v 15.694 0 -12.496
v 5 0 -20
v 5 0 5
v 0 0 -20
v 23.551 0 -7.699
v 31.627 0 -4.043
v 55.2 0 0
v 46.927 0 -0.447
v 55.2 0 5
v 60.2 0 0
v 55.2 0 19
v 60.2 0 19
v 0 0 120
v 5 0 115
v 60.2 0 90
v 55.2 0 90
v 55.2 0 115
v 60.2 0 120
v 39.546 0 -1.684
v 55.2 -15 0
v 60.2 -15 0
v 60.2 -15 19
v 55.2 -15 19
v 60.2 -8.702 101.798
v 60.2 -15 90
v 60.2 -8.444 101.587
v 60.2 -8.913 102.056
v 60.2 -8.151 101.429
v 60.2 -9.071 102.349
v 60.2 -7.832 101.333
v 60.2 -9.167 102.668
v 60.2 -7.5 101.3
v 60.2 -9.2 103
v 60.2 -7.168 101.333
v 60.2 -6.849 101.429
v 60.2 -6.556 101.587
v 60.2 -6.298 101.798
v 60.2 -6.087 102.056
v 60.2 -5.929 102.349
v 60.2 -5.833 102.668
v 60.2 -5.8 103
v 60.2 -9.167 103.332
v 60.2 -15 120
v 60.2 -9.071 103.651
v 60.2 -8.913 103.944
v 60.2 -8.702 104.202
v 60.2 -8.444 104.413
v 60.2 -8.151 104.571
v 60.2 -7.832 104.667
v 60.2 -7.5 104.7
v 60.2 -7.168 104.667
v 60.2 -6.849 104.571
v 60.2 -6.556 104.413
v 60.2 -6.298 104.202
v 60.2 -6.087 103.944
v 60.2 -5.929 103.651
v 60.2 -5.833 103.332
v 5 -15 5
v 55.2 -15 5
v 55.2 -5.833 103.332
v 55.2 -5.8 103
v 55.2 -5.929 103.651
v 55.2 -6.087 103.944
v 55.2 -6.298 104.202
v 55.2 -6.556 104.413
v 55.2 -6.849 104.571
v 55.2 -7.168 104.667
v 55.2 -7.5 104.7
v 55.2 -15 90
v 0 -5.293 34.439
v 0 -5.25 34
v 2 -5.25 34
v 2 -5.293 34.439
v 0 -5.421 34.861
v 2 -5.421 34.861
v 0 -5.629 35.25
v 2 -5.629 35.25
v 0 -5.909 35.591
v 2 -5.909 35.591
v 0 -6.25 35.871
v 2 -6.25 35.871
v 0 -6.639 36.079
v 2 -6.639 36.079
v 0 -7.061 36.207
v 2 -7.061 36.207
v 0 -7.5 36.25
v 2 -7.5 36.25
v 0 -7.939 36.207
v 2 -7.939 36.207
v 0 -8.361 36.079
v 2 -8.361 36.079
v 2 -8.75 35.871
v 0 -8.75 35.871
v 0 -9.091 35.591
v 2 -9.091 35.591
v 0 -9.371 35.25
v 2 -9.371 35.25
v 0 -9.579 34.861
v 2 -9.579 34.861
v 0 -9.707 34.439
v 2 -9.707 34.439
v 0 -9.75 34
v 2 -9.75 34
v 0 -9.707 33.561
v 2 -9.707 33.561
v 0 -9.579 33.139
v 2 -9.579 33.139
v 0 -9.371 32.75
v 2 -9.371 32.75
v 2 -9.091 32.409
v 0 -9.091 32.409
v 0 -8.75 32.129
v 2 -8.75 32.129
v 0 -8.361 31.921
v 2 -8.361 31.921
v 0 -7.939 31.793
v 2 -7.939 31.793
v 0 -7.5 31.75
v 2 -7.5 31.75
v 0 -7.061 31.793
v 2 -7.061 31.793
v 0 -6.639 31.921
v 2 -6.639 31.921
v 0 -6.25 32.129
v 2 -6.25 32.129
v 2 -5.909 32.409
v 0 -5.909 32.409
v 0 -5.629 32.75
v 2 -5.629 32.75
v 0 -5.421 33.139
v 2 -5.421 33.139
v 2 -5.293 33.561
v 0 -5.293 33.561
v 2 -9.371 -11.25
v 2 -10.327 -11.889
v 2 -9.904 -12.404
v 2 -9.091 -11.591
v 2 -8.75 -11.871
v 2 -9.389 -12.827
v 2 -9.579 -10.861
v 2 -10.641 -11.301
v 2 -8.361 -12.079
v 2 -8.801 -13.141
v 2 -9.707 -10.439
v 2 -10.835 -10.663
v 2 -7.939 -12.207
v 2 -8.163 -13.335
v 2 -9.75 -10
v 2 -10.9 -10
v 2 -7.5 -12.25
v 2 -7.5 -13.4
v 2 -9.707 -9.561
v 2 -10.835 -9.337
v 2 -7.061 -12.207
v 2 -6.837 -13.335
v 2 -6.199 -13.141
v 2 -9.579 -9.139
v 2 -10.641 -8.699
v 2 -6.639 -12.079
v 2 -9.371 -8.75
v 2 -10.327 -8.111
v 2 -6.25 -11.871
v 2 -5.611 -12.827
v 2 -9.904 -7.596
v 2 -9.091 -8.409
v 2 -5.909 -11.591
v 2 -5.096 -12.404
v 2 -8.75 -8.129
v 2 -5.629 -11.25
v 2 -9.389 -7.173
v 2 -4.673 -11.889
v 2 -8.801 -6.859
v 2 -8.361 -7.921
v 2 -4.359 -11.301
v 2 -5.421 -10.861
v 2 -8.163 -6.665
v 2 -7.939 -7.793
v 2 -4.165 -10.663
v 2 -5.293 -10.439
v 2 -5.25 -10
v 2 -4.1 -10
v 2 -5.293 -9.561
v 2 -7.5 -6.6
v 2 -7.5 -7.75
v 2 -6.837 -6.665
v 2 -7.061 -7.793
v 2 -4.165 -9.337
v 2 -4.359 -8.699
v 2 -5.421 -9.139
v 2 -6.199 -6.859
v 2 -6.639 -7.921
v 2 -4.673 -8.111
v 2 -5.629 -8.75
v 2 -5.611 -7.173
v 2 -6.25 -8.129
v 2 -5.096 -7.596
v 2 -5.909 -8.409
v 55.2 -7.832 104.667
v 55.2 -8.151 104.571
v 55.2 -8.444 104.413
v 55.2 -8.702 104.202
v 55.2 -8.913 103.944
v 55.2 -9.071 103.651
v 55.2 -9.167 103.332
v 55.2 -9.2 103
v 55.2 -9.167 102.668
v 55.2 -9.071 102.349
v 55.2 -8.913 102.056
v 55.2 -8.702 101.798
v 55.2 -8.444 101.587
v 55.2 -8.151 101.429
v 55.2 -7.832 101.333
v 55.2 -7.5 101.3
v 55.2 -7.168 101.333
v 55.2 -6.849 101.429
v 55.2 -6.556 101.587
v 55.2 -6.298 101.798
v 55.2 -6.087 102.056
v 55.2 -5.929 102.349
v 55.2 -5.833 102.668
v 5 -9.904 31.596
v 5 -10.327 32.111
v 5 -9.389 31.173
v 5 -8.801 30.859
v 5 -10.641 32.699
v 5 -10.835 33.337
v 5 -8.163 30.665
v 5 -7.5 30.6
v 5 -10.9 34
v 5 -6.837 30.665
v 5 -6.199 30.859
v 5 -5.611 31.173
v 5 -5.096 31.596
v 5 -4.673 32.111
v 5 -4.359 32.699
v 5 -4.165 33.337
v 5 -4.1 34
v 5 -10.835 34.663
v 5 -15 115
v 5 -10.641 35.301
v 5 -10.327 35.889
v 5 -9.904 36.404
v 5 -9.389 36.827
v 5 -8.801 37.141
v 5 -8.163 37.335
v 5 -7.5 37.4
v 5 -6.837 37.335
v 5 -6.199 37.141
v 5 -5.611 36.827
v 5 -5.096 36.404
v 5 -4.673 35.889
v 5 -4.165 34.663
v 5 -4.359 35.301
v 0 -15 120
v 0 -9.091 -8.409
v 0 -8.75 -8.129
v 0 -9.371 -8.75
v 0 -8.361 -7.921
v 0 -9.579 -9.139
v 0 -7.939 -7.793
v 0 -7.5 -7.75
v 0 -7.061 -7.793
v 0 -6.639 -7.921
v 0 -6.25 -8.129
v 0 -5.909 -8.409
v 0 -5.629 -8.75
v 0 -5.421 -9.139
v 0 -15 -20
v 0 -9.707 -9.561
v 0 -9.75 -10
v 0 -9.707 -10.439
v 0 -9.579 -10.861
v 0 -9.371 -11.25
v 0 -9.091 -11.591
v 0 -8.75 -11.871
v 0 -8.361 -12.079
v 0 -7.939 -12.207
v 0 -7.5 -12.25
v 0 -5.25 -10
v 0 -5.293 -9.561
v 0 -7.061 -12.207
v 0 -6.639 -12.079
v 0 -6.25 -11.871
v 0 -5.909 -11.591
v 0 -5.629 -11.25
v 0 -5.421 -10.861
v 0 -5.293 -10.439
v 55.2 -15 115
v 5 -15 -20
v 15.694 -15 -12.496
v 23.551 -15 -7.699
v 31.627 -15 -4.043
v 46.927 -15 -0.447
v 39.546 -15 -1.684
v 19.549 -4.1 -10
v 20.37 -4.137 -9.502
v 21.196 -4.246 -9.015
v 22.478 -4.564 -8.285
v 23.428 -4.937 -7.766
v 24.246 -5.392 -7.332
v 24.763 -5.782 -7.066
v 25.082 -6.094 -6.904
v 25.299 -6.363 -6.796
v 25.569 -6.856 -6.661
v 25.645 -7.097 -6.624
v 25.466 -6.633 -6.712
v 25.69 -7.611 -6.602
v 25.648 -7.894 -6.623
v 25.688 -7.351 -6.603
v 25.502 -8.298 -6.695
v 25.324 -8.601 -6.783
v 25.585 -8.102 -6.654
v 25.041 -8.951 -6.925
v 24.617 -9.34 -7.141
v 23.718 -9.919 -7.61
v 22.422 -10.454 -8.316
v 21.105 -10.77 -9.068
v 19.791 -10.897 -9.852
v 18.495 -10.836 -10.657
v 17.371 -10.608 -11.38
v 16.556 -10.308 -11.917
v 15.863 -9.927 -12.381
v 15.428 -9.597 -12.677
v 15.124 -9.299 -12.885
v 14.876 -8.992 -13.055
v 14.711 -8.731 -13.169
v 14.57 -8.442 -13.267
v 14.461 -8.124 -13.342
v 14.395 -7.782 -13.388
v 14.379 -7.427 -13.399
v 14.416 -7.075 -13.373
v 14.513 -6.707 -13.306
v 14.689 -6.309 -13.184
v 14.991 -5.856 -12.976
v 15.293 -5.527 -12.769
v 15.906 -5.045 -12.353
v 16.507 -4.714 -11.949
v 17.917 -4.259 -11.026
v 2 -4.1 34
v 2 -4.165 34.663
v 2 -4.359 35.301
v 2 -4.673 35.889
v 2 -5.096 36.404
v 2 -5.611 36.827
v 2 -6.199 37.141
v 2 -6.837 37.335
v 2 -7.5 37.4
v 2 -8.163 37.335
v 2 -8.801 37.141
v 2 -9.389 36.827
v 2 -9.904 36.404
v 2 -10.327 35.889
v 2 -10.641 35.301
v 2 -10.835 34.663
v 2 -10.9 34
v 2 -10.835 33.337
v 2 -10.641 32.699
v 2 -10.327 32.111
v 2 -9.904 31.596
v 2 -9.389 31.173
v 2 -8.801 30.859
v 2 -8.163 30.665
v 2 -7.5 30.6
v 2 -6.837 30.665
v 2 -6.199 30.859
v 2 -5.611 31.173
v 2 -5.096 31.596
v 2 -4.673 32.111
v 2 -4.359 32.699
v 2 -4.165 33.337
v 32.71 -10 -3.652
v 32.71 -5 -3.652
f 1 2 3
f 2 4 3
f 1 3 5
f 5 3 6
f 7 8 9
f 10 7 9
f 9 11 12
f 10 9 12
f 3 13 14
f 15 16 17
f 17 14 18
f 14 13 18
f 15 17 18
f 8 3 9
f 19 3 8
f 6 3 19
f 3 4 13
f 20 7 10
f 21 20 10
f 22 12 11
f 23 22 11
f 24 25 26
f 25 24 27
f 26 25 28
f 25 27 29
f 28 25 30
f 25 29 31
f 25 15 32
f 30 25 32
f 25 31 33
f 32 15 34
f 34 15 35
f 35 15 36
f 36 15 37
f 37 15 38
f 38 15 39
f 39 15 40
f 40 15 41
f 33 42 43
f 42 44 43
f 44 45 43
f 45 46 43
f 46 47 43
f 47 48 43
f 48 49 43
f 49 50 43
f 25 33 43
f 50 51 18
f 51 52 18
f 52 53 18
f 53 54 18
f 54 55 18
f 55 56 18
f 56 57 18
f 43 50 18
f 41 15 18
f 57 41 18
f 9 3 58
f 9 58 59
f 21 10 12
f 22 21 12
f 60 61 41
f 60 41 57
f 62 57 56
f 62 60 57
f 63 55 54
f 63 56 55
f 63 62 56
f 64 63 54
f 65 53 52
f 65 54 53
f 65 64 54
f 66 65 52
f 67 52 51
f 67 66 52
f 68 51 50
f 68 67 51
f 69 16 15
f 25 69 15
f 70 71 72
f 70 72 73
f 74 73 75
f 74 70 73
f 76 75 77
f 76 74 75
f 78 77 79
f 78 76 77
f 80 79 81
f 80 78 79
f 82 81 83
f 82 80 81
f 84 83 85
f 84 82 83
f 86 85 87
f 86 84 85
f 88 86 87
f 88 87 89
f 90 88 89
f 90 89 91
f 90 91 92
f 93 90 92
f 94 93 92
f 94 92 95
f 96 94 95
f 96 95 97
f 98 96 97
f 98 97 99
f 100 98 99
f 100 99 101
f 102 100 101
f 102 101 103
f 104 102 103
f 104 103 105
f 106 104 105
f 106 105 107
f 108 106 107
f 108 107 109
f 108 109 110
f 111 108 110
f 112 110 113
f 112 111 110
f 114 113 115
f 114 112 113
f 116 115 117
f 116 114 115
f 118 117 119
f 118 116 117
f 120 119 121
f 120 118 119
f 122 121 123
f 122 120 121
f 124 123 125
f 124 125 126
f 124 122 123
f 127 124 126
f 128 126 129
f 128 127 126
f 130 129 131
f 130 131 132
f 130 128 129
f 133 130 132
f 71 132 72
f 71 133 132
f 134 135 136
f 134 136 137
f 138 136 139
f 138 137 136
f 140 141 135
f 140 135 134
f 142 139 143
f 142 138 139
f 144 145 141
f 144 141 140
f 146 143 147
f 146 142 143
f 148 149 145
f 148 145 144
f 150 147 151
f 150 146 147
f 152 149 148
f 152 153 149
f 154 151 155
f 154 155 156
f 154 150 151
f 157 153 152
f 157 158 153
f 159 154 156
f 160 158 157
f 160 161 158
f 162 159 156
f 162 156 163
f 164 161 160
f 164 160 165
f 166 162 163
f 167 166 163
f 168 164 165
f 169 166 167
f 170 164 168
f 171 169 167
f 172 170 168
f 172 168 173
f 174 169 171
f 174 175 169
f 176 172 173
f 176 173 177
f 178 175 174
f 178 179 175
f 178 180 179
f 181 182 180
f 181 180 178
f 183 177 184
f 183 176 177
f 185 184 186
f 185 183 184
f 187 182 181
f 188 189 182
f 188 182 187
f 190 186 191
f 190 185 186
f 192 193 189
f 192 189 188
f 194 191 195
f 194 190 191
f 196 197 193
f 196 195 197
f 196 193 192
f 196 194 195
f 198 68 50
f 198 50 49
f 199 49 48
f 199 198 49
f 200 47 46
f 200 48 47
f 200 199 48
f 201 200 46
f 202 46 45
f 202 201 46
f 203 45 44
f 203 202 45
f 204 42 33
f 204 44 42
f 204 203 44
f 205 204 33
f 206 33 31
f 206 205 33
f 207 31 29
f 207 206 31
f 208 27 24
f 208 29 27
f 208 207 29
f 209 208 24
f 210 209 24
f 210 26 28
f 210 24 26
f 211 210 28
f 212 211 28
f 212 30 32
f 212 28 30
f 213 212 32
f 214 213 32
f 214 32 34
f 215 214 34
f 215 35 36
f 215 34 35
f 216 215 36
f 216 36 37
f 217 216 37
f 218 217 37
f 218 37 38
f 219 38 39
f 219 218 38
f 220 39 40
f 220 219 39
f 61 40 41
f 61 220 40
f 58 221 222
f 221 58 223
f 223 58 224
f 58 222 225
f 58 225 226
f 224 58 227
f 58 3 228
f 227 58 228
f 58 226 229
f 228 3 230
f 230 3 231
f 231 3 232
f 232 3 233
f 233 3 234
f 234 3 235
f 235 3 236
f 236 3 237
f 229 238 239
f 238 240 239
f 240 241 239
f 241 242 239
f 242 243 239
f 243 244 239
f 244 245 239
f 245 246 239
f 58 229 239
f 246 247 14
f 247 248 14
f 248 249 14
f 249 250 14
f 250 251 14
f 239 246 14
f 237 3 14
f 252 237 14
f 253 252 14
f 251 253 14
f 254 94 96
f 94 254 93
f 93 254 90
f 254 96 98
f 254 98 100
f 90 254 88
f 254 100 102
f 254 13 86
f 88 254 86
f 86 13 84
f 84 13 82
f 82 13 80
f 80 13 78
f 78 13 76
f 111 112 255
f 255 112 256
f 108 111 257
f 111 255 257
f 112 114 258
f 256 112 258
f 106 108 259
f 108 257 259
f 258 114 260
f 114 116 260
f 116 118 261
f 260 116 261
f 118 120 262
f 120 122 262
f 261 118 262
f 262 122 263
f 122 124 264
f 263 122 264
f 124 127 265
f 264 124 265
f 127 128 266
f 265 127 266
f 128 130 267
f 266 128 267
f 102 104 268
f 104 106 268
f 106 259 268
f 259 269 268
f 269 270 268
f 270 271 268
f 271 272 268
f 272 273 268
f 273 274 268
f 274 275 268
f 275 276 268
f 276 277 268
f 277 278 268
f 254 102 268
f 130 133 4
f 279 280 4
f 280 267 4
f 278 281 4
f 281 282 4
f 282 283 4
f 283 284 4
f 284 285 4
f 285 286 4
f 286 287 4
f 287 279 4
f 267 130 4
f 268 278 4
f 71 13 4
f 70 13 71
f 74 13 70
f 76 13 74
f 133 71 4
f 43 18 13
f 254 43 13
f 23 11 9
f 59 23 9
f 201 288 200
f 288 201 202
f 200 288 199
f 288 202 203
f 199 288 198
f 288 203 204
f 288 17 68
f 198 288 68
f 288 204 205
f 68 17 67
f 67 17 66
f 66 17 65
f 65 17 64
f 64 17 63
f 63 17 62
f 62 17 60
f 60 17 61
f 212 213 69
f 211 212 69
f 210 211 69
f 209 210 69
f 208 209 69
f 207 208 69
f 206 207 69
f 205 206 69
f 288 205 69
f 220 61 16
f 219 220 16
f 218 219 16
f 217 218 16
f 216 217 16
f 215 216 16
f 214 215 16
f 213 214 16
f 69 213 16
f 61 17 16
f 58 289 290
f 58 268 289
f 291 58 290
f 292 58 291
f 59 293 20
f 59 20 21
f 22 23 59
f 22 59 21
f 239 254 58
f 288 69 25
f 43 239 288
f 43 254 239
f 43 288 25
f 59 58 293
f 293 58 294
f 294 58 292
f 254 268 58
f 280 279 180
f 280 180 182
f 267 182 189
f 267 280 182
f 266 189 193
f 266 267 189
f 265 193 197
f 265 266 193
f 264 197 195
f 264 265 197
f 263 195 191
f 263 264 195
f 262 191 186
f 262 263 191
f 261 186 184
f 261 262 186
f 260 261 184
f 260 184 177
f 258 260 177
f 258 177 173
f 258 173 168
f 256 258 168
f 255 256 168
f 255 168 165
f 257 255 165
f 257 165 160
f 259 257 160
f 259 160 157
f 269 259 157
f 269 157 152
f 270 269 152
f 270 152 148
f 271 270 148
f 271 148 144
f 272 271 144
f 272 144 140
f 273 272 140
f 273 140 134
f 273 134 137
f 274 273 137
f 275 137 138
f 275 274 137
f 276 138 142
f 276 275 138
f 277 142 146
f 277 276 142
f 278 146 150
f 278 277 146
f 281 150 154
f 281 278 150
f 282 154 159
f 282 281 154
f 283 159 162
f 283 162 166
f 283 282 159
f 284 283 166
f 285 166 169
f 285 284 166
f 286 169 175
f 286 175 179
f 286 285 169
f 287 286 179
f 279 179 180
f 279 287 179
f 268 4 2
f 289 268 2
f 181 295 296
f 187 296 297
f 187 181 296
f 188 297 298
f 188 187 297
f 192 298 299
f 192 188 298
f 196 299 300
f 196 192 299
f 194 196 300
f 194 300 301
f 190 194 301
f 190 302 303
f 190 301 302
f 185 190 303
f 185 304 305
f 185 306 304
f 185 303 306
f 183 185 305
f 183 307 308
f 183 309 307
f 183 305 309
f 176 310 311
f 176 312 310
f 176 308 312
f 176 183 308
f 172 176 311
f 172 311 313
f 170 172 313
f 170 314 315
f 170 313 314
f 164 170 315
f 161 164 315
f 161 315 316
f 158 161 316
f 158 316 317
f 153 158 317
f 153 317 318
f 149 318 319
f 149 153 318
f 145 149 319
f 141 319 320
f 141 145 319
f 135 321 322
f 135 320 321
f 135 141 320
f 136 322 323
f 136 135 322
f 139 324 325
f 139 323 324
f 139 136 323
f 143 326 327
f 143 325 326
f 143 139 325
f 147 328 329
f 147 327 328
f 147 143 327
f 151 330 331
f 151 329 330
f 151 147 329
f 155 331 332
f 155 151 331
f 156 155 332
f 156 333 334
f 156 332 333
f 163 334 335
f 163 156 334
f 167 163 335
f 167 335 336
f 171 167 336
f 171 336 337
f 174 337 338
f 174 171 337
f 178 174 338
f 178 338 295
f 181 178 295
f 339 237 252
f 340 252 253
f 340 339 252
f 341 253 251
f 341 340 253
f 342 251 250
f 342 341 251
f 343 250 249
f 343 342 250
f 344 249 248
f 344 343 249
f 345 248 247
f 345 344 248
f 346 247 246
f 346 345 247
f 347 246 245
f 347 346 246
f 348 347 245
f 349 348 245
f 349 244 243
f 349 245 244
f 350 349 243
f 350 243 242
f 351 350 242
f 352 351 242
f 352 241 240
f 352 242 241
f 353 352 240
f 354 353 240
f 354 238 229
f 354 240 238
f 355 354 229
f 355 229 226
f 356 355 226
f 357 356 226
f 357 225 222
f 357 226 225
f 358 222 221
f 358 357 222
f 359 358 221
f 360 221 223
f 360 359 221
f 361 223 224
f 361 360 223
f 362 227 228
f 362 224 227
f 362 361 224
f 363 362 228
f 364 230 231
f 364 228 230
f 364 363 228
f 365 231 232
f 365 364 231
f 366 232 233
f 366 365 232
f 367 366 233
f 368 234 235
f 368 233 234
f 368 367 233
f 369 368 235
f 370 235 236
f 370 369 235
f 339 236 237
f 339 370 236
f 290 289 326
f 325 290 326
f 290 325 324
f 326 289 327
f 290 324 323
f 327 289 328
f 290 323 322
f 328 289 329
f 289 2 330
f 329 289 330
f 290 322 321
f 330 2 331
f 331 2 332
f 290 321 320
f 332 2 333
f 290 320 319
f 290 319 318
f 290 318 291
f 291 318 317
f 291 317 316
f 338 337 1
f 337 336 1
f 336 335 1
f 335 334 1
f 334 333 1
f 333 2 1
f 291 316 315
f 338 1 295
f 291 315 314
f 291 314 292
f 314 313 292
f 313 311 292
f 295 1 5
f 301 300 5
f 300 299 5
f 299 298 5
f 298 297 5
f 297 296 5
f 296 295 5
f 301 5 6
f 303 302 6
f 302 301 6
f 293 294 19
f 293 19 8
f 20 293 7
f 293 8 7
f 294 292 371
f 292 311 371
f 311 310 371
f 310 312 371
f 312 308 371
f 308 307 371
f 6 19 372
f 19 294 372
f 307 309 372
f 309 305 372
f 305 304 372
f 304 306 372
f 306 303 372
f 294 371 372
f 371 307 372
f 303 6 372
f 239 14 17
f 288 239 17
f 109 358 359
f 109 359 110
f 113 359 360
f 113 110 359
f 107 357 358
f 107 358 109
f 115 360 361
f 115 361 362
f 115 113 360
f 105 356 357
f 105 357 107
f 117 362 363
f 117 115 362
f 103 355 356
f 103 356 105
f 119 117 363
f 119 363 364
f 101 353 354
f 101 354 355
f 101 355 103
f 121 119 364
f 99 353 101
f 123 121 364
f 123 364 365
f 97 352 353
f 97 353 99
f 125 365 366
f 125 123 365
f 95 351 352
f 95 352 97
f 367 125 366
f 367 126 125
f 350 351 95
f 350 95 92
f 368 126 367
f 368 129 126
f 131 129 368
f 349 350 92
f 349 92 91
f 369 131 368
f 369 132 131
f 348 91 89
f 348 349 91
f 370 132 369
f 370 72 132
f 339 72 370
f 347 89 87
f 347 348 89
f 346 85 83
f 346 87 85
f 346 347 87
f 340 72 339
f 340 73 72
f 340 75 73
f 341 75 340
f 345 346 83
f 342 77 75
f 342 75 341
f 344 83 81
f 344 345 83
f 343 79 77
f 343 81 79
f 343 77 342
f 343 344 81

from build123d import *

# Parameters (mm, degrees)
F1_W     = 5
F1_H     = 10
F1_W_2   = 50.2
F1_H_2   = 5
F1_H_3   = 11
F2_DEPTH = 15
F3_START = 25
F3_DEPTH = 49
F0_R     = 2.25
F4_DEPTH = 38.6
F5_START = 2
F0_R_2   = 3.4
F5_DEPTH = 47.7


with BuildPart() as f2:
    # F1 (on Front) → F2 (new body)
    with BuildSketch(Plane.XZ):
        Polygon((0, 34), (0, 0), (5, 0), (5, 5), (5, 34), align=None)
        with Locations((2.5, -5)):
            Rectangle(F1_W, F1_H)
        with Locations((30.1, 2.5)):
            Rectangle(F1_W_2, F1_H_2)
        with BuildLine():
            Line((55.2, 0), (5, 0))
            Line((5, 0), (5, -10))
            Line((5, -10), (5, -20))
            add(Edge.make_bspline(
                [(5, -20), (15.5953727663, -13.1017330475), (28.5827647895, 0), (55.2, 0)],
                knots=[0, 0, 0, 0, 54.0373944598, 54.0373944598, 54.0373944598, 54.0373944598], degree=3))
        make_face()
        Polygon((0, 120), (0, 34), (5, 34), (5, 115), (5, 120), align=None)
        with Locations((2.5, -15)):
            Rectangle(F1_W, F1_H)
        Polygon((55.2, 5), (55.2, 0), (60.2, 0), (60.2, 19), (55.2, 19), align=None)
        with Locations((30.1, 117.5)):
            Rectangle(F1_W_2, F1_H_2)
        Polygon((60.2, 120), (55.2, 120), (55.2, 115), (55.2, 101), (60.2, 101), align=None)
        with Locations((57.7, 95.5)):
            Rectangle(F1_W, F1_H_3)
    extrude(amount=F2_DEPTH)

    # F0 (on Right) → F3 (cut)
    with BuildSketch(Plane.YZ.offset(F3_START)):
        with BuildLine():
            ThreePointArc((-5.8, 103), (-6.297918472, 104.202081528), (-7.5, 104.7))
            ThreePointArc((-7.5, 104.7), (-8.702081528, 101.797918472), (-5.8, 103))
        make_face()
    extrude(amount=F3_DEPTH, mode=Mode.SUBTRACT)

    # F0 (on Right) → F4 (cut)
    with BuildSketch(Plane.YZ):
        with Locations((-7.5, 34)):
            Circle(F0_R)
        with Locations((-7.5, -10)):
            Circle(F0_R)
    extrude(amount=F4_DEPTH, mode=Mode.SUBTRACT)

    # F0 (on Right) → F5 (cut)
    with BuildSketch(Plane.YZ.offset(F5_START)):
        with Locations((-7.5, -10)):
            Circle(F0_R_2)
        with Locations((-7.5, -10)):
            Circle(F0_R, mode=Mode.SUBTRACT)
        with Locations((-7.5, 34)):
            Circle(F0_R_2)
        with Locations((-7.5, 34)):
            Circle(F0_R, mode=Mode.SUBTRACT)
    extrude(amount=F5_DEPTH, mode=Mode.SUBTRACT)


solid = f2.part
